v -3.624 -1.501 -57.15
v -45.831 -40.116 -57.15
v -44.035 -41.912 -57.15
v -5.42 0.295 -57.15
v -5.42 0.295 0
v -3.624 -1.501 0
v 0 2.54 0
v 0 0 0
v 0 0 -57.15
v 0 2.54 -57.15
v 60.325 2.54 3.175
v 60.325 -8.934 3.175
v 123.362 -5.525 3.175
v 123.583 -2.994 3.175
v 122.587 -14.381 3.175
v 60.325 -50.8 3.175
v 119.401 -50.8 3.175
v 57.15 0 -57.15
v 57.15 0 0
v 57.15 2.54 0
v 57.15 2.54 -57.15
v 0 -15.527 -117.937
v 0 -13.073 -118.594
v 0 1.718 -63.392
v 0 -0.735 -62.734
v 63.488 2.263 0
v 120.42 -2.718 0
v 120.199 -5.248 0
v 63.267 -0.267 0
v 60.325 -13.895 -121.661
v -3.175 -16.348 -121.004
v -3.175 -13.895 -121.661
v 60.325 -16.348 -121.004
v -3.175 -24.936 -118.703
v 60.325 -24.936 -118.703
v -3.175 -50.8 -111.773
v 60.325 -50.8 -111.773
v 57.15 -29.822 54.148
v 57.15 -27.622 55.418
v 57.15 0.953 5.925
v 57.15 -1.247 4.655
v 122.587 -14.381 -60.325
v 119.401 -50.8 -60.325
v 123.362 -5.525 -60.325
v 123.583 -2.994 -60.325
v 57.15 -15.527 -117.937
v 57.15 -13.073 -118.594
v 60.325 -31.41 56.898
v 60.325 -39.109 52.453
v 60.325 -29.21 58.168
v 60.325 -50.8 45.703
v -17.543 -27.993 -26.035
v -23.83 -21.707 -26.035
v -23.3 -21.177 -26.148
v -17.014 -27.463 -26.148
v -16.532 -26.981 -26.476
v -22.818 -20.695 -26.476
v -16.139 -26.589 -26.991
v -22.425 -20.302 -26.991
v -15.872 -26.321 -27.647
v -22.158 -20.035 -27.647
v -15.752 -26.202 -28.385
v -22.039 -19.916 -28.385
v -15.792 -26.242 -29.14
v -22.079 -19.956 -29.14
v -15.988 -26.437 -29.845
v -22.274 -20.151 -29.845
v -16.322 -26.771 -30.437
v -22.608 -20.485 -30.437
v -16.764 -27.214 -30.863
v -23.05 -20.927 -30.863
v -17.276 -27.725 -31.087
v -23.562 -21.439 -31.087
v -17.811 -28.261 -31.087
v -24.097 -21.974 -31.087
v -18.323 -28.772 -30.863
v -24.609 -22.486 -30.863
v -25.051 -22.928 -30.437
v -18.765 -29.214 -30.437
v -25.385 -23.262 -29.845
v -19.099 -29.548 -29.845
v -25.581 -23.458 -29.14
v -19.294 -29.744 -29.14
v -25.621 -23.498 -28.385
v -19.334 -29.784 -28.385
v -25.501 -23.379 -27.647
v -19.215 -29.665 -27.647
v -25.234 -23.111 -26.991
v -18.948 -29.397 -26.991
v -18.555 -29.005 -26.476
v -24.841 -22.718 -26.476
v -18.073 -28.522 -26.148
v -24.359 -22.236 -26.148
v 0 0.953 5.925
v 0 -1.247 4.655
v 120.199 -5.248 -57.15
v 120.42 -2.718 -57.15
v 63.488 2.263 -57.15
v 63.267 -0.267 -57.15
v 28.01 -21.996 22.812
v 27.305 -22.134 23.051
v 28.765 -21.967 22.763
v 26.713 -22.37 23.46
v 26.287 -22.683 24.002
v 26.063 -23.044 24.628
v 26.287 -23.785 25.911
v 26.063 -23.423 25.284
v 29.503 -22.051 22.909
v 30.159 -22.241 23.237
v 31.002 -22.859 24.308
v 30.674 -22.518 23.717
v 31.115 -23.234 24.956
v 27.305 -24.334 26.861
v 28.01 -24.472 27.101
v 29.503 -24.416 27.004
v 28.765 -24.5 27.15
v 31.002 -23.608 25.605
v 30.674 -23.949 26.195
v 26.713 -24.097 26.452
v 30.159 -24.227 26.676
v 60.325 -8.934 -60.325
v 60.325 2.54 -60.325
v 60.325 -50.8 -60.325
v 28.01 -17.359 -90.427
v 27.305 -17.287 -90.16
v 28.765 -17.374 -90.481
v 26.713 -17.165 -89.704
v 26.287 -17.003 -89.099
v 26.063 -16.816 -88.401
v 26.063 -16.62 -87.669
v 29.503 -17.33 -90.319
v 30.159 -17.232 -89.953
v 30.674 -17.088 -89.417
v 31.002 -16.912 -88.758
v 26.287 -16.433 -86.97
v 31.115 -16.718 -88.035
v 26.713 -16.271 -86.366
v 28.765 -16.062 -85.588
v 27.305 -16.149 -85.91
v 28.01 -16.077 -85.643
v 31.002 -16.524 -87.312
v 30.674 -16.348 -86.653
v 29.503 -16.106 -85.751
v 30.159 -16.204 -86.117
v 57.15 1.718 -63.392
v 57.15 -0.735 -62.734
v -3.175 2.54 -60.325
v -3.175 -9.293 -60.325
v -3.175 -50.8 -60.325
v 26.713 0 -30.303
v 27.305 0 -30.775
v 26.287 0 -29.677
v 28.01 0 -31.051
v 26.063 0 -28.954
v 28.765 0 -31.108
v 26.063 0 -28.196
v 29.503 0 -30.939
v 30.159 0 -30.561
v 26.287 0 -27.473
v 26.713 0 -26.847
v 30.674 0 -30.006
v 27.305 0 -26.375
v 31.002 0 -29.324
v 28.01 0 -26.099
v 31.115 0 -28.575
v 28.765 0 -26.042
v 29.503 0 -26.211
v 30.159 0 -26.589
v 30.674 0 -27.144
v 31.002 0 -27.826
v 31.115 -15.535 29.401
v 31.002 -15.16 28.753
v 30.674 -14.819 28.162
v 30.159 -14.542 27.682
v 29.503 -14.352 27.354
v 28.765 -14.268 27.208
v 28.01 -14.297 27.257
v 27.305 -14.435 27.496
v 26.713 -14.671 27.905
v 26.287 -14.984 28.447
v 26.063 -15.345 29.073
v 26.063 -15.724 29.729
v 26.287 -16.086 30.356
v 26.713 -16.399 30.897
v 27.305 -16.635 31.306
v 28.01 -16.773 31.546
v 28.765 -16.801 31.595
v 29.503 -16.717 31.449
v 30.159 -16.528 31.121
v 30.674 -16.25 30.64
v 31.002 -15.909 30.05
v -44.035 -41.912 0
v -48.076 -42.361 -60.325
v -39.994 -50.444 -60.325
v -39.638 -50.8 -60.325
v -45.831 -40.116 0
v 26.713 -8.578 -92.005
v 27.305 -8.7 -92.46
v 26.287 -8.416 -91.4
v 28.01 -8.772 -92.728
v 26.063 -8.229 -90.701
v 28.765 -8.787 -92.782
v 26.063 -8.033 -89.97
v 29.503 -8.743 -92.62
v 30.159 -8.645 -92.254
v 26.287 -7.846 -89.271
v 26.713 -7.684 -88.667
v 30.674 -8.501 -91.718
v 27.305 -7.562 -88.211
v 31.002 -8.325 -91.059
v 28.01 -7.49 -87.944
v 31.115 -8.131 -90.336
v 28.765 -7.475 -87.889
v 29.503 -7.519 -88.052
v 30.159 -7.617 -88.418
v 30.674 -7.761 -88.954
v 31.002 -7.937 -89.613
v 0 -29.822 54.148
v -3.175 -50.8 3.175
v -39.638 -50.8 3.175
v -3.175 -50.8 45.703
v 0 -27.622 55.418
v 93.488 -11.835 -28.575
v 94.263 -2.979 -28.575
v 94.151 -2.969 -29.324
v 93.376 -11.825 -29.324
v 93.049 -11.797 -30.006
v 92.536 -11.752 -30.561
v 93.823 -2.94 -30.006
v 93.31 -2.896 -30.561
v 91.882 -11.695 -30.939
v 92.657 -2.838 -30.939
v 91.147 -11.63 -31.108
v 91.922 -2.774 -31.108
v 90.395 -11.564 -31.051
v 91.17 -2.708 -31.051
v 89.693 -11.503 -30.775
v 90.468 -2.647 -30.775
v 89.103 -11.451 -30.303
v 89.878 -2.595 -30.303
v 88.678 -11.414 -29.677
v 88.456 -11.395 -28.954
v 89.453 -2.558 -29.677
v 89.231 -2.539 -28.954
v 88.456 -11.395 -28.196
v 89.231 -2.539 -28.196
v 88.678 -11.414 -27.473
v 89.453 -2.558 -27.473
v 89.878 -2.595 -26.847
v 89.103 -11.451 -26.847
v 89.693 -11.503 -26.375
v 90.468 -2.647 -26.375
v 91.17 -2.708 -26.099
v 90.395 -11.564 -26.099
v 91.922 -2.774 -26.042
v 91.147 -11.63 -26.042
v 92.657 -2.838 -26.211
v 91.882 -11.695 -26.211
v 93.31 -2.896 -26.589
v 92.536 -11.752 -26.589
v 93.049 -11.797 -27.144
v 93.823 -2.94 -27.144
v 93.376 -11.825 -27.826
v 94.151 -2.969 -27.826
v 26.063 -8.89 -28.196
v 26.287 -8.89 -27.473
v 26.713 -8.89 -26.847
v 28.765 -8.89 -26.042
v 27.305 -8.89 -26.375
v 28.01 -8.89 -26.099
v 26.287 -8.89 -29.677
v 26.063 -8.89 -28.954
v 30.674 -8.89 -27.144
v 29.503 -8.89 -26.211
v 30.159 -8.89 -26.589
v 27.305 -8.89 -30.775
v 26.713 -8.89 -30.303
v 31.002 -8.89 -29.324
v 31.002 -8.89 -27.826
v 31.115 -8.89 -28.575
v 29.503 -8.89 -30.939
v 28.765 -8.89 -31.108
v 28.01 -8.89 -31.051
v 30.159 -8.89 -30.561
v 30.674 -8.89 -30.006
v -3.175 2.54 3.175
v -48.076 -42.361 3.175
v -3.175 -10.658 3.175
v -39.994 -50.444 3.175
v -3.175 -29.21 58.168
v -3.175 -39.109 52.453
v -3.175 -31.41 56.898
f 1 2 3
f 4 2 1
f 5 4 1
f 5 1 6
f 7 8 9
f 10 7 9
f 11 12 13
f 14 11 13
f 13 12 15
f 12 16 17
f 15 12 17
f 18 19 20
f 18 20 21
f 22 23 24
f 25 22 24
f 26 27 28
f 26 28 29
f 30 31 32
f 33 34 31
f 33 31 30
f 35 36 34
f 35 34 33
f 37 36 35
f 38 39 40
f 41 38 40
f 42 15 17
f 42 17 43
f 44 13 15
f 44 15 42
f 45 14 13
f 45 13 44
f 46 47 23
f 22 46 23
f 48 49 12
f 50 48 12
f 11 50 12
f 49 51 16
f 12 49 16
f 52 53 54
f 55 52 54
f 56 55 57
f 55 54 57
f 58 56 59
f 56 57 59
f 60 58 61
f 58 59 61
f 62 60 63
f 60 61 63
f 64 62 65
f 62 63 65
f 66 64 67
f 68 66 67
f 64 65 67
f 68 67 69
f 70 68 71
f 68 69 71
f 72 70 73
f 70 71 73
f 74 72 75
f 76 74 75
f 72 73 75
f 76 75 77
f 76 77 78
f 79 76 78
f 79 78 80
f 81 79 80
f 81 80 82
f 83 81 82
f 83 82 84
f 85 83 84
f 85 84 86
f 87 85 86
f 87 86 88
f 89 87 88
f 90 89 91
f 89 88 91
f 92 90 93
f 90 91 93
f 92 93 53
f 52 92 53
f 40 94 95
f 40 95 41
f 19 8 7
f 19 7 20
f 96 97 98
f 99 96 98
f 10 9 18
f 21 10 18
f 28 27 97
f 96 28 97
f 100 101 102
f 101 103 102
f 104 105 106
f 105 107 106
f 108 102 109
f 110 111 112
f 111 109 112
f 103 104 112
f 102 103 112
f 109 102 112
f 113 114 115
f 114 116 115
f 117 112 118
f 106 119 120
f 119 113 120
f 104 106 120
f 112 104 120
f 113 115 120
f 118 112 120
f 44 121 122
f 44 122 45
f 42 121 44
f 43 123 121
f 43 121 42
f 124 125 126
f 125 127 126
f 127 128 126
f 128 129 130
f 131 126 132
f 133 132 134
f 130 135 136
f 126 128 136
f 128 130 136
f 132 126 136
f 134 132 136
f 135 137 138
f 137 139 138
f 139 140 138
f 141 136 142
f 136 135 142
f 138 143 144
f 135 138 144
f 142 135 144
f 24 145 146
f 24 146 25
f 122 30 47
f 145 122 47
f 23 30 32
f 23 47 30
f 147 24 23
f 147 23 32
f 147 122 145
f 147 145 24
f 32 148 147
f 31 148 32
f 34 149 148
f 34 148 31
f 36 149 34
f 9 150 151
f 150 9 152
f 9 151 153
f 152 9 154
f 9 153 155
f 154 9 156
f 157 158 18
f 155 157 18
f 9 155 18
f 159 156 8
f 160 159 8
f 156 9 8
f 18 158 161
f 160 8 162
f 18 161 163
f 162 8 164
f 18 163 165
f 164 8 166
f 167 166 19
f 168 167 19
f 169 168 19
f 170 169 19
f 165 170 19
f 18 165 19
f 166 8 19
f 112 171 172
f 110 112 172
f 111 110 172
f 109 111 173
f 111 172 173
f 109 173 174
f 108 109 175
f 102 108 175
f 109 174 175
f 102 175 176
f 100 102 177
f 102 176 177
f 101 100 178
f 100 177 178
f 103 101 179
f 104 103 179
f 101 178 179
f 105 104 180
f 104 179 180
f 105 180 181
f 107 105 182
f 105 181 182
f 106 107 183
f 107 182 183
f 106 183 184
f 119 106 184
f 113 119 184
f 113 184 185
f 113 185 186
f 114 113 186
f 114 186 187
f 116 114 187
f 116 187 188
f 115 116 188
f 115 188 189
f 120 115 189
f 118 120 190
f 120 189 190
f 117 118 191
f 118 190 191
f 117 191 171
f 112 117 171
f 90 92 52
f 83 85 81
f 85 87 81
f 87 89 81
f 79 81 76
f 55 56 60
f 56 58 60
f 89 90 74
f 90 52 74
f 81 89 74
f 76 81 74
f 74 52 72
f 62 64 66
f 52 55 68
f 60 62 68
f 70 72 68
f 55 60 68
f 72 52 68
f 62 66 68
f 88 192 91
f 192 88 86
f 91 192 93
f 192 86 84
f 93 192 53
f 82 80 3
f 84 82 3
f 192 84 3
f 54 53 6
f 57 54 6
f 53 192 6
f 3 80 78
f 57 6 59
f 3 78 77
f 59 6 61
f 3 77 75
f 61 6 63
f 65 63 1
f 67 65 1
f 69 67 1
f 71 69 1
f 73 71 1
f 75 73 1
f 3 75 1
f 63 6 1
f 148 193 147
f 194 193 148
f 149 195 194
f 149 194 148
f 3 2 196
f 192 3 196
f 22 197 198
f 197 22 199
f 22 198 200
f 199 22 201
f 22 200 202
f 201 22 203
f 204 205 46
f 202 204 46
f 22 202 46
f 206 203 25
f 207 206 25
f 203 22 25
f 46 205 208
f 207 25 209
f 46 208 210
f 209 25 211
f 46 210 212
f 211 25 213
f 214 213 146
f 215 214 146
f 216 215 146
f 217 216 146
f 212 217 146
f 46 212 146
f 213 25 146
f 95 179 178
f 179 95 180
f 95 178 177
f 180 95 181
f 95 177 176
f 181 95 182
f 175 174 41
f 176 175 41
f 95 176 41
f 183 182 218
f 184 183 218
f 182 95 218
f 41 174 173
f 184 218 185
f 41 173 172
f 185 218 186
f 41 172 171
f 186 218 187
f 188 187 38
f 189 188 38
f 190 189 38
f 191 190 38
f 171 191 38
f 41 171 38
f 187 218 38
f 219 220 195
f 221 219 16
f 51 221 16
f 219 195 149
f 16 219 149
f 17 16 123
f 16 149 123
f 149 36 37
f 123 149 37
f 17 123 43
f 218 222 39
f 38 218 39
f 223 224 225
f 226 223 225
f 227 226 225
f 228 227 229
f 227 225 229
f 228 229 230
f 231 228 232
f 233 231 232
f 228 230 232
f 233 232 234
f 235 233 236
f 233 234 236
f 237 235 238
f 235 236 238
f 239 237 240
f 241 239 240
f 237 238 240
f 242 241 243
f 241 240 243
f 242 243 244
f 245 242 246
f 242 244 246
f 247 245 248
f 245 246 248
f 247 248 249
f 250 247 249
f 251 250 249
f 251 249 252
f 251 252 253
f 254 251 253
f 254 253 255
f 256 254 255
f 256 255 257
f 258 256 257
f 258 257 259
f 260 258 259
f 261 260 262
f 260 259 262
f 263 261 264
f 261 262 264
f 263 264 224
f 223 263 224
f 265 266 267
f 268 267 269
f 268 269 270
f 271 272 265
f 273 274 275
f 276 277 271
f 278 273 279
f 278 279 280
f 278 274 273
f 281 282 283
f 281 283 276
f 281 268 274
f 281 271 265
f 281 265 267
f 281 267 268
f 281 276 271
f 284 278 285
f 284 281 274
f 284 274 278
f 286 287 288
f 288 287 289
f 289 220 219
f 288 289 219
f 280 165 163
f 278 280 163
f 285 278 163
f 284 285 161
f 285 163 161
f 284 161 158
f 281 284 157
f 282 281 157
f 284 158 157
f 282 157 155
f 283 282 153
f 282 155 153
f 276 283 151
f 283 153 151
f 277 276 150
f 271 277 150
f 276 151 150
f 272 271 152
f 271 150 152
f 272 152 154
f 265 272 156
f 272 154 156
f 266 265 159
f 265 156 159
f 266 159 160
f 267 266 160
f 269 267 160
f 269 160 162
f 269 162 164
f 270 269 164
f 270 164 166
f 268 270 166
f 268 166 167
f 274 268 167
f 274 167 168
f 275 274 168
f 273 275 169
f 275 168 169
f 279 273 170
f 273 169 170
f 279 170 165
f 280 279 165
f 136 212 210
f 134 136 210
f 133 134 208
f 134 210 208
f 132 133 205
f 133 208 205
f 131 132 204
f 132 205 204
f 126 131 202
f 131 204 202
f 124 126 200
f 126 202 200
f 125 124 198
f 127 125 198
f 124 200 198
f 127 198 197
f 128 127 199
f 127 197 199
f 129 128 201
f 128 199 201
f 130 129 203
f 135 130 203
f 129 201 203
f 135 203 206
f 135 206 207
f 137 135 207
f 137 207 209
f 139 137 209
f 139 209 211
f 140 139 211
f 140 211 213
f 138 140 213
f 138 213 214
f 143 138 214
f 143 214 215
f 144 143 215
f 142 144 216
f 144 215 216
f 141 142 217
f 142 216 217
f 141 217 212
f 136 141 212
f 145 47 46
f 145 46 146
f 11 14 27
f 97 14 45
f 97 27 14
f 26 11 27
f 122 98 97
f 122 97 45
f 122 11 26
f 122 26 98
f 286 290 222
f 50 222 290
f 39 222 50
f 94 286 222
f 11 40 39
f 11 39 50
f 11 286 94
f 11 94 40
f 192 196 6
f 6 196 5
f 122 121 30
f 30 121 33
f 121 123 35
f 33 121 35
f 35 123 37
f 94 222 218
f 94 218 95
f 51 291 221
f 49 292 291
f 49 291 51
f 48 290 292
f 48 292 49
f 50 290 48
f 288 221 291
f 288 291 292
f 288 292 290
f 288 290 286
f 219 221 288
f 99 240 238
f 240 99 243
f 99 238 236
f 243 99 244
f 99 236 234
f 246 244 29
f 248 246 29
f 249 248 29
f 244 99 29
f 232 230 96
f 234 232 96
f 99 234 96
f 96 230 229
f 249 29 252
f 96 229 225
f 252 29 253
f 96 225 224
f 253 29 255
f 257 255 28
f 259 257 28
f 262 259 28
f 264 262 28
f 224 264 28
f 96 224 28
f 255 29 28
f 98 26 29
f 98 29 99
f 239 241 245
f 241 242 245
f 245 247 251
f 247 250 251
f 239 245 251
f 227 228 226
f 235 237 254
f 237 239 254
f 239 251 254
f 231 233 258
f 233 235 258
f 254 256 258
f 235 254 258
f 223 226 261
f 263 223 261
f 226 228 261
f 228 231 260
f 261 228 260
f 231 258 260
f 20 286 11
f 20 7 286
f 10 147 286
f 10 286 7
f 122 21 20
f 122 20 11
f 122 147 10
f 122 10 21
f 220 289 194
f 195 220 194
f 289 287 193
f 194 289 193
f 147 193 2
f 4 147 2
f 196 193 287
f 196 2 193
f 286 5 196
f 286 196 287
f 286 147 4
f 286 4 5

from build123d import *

# Parameters (mm, degrees)
SKETCH1_W            = 63.5
SKETCH1_H            = 63.5
SKETCH1_W_2          = 57.15
SKETCH1_H_2          = 57.15
BOSS_EXTRUDE1_DEPTH  = 2.54
SKETCH2_W            = 63.5
SKETCH2_H            = 63.5
BOSS_EXTRUDE2_DEPTH  = 8.89
SKETCH3_R            = 2.54
CUT_EXTRUDE1_DEPTH   = 8.89
SKETCH4_W            = 63.5
SKETCH4_H            = 63.5
SKETCH4_W_2          = 57.15
SKETCH4_H_2          = 57.15
BOSS_EXTRUDE3_DEPTH  = 2.54
SKETCH5_W            = 63.5
SKETCH5_H            = 63.5
BOSS_EXTRUDE4_DEPTH  = 8.89
SKETCH6_R            = 2.54
CUT_EXTRUDE2_DEPTH   = 8.89
SKETCH7_W            = 63.5
SKETCH7_H            = 63.5
SKETCH7_W_2          = 57.15
SKETCH7_H_2          = 57.15
BOSS_EXTRUDE5_DEPTH  = 2.54
SKETCH8_W            = 63.5
SKETCH8_H            = 63.5
BOSS_EXTRUDE6_DEPTH  = 8.89
SKETCH9_R            = 2.54
CUT_EXTRUDE3_DEPTH   = 8.89
SKETCH10_W           = 63.5
SKETCH10_H           = 63.5
SKETCH10_W_2         = 57.15
SKETCH10_H_2         = 57.15
BOSS_EXTRUDE7_DEPTH  = 2.54
SKETCH11_W           = 63.5
SKETCH11_H           = 63.5
BOSS_EXTRUDE8_DEPTH  = 8.89
SKETCH12_R           = 2.54
CUT_EXTRUDE4_DEPTH   = 8.89
SKETCH14_W           = 63.5
SKETCH14_H           = 63.5
SKETCH14_W_2         = 57.15
SKETCH14_H_2         = 57.15
BOSS_EXTRUDE10_DEPTH = 2.54
SKETCH15_W           = 63.5
SKETCH15_H           = 63.5
BOSS_EXTRUDE11_DEPTH = 8.89
SKETCH16_R           = 2.54
CUT_EXTRUDE5_DEPTH   = 8.89
BOSS_EXTRUDE12_REACH = 55.34
SKETCH18_W           = 63.258363329
SKETCH18_H           = 63.5
CUT_EXTRUDE7_REACH   = 53.155
SKETCH19_W           = 21.300485008
SKETCH19_H           = 63.5
BOSS_EXTRUDE15_REACH = 55.34
SKETCH20_W           = 63.5
SKETCH20_H           = 58.16761314
CUT_EXTRUDE8_START   = -13.499985
SKETCH21_W           = 63.5
SKETCH21_H           = 36.305948049
CUT_EXTRUDE8_DEPTH   = 13.499985
BOSS_EXTRUDE16_REACH = 55.34
SKETCH22_W           = 48.076280605
SKETCH22_H           = 63.5
CUT_EXTRUDE9_START   = -0.504151
SKETCH23_W           = 63.5
SKETCH23_H           = 4.915504187
CUT_EXTRUDE9_DEPTH   = 0.504151
BOSS_EXTRUDE18_REACH = 55.34
SKETCH24_W           = 63.5
SKETCH24_H           = 64.511289969
CUT_EXTRUDE10_START  = -26.776858
SKETCH25_W           = 63.5
SKETCH25_H           = 23.443872205
CUT_EXTRUDE10_DEPTH  = 26.776858
SKETCH26_W           = 63.5
SKETCH26_H           = 63.5
BOSS_EXTRUDE19_DEPTH = 41.91


with BuildPart() as part:
    # Sketch1 → Boss-Extrude1 (new body)
    with BuildSketch(Plane(origin=(0, 0, 0), x_dir=(1, 0, 0), z_dir=(0, 1, 0))):
        with Locations((28.575, 28.575)):
            Rectangle(SKETCH1_W, SKETCH1_H)
        with Locations((28.575, 28.575)):
            Rectangle(SKETCH1_W_2, SKETCH1_H_2, mode=Mode.SUBTRACT)
    extrude(amount=BOSS_EXTRUDE1_DEPTH)

    # Sketch2 → Boss-Extrude2 (add)
    with BuildSketch(Plane.XZ):
        with Locations((28.575, -28.575)):
            Rectangle(SKETCH2_W, SKETCH2_H)
    extrude(amount=BOSS_EXTRUDE2_DEPTH)

    # Sketch3 → Cut-Extrude1 (cut)
    with BuildSketch(Plane(origin=(0, 0, 0), x_dir=(1, 0, 0), z_dir=(0, 1, 0))):
        with Locations((28.575, 28.575)):
            Circle(SKETCH3_R)
    extrude(amount=-CUT_EXTRUDE1_DEPTH, mode=Mode.SUBTRACT)



with BuildPart() as body_2:
    # Sketch4 → Boss-Extrude3 (new body)
    with BuildSketch(Plane(origin=(0.678769335, 7.758369005, 0), x_dir=(0, 0, -1), z_dir=(0.087155743, 0.996194698, 0))):
        with Locations((28.575, -91.624069576)):
            Rectangle(SKETCH4_W, SKETCH4_H)
        with Locations((28.575, -91.624069576)):
            Rectangle(SKETCH4_W_2, SKETCH4_H_2, mode=Mode.SUBTRACT)
    extrude(amount=-BOSS_EXTRUDE3_DEPTH)

    # Sketch5 → Boss-Extrude4 (add)
    with BuildSketch(Plane(origin=(0.457393749, 5.228034472, 0), x_dir=(0.996194698, -0.087155743, 0), z_dir=(-0.087155743, -0.996194698, 0))):
        with Locations((91.624069576, -28.575)):
            Rectangle(SKETCH5_W, SKETCH5_H)
    extrude(amount=BOSS_EXTRUDE4_DEPTH)

    # Sketch6 → Cut-Extrude2 (cut)
    with BuildSketch(Plane(origin=(0.457393749, 5.228034472, 0), x_dir=(0.996194698, -0.087155743, 0), z_dir=(0.087155743, 0.996194698, 0))):
        with Locations((91.624069576, 28.575)):
            Circle(SKETCH6_R)
    extrude(amount=-CUT_EXTRUDE2_DEPTH, mode=Mode.SUBTRACT)


with BuildPart() as part_1:
    add(part.part)

    add(body_2.part)  # Boss-Extrude5 merges body 2
    # Sketch7 → Boss-Extrude5 (add)
    with BuildSketch(Plane(origin=(0, 17.451102263, -4.676008758), x_dir=(-1, 0, 0), z_dir=(0, 0.965925826, -0.258819045))):
        with Locations((-28.575, -89.362075096)):
            Rectangle(SKETCH7_W, SKETCH7_H)
        with Locations((-28.575, -89.362075096)):
            Rectangle(SKETCH7_W_2, SKETCH7_H_2, mode=Mode.SUBTRACT)
    extrude(amount=-BOSS_EXTRUDE5_DEPTH)

    # Sketch8 → Boss-Extrude6 (add)
    with BuildSketch(Plane(origin=(0, 14.997650664, -4.018608384), x_dir=(1, 0, 0), z_dir=(0, -0.965925826, 0.258819045))):
        with Locations((28.575, -89.362075096)):
            Rectangle(SKETCH8_W, SKETCH8_H)
    extrude(amount=BOSS_EXTRUDE6_DEPTH)

    # Sketch9 → Cut-Extrude3 (cut)
    with BuildSketch(Plane(origin=(0, 14.997650664, -4.018608384), x_dir=(1, 0, 0), z_dir=(0, 0.965925826, -0.258819045))):
        with Locations((28.575, 89.362075096)):
            Circle(SKETCH9_R)
    extrude(amount=-CUT_EXTRUDE3_DEPTH, mode=Mode.SUBTRACT)

    # Sketch10 → Boss-Extrude7 (add)
    with BuildSketch(Plane(origin=(0, 3.279815329, 1.893602263), x_dir=(1, 0, 0), z_dir=(0, 0.866025404, 0.5))):
        with Locations((28.575, -33.229630657)):
            Rectangle(SKETCH10_W, SKETCH10_H)
        with Locations((28.575, -33.229630657)):
            Rectangle(SKETCH10_W_2, SKETCH10_H_2, mode=Mode.SUBTRACT)
    extrude(amount=-BOSS_EXTRUDE7_DEPTH)

    # Sketch11 → Boss-Extrude8 (add)
    with BuildSketch(Plane(origin=(0, 1.080110803, 0.623602263), x_dir=(1, 0, 0), z_dir=(0, -0.866025404, -0.5))):
        with Locations((28.575, 33.229630657)):
            Rectangle(SKETCH11_W, SKETCH11_H)
    extrude(amount=BOSS_EXTRUDE8_DEPTH)

    # Sketch12 → Cut-Extrude4 (cut)
    with BuildSketch(Plane(origin=(0, 1.080110803, 0.623602263), x_dir=(1, 0, 0), z_dir=(0, 0.866025404, 0.5))):
        with Locations((28.575, -33.229630657)):
            Circle(SKETCH12_R)
    extrude(amount=-CUT_EXTRUDE4_DEPTH, mode=Mode.SUBTRACT)

    # Sketch14 → Boss-Extrude10 (add)
    with BuildSketch(Plane(origin=(-2.8575, 2.8575, 0), x_dir=(0, 0, 1), z_dir=(-0.707106781, 0.707106781, 0))):
        with Locations((-28.575, -32.199012806)):
            Rectangle(SKETCH14_W, SKETCH14_H)
        with Locations((-28.575, -32.199012806)):
            Rectangle(SKETCH14_W_2, SKETCH14_H_2, mode=Mode.SUBTRACT)
    extrude(amount=-BOSS_EXTRUDE10_DEPTH)

    # Sketch15 → Boss-Extrude11 (add)
    with BuildSketch(Plane(origin=(-1.061448776, 1.061448776, 0), x_dir=(0, 0, -1), z_dir=(0.707106781, -0.707106781, 0))):
        with Locations((28.575, -32.199012806)):
            Rectangle(SKETCH15_W, SKETCH15_H)
    extrude(amount=BOSS_EXTRUDE11_DEPTH)

    # Sketch16 → Cut-Extrude5 (cut)
    with BuildSketch(Plane(origin=(-1.061448776, 1.061448776, 0), x_dir=(0, 0, 1), z_dir=(-0.707106781, 0.707106781, 0))):
        with Locations((-28.575, -32.199012806)):
            Circle(SKETCH16_R)
    extrude(amount=-CUT_EXTRUDE5_DEPTH, mode=Mode.SUBTRACT)

    # Boss-Extrude12: up to this face of the body (flat: up to its plane)
    boss_extrude12_end = Plane(part_1.part.faces().sort_by_distance((60.351110962, -8.935945156, -58.051047878))[0])
    # Sketch18 → Boss-Extrude12 (add, up to the picked face)
    with BuildSketch(Plane(origin=(0, -50.8, 0), x_dir=(1, 0, 0), z_dir=(0, 1, 0)), mode=Mode.PRIVATE) as boss_extrude12_sk1:
        with Locations((91.954181664, 28.575)):
            Rectangle(SKETCH18_W, SKETCH18_H)
    boss_extrude12_tool1 = split(extrude(boss_extrude12_sk1.sketch, amount=BOSS_EXTRUDE12_REACH, mode=Mode.PRIVATE), bisect_by=boss_extrude12_end, keep=Keep.BOTH, mode=Mode.PRIVATE)
    add(boss_extrude12_tool1.solids().sort_by_distance((91.954182, -50.8, -28.575))[0])

    # Cut-Extrude7: up to this face of the body (flat: up to its plane)
    cut_extrude7_end = Plane(part_1.part.faces().sort_by_distance((91.954181664, -50.8, -28.575))[0])
    # Sketch19 → Cut-Extrude7 (cut, up to the picked face)
    with BuildSketch(Plane(origin=(-0.317420804, -3.628136394, 0), x_dir=(0.996194698, -0.087155743, 0), z_dir=(0.087155743, 0.996194698, 0)), mode=Mode.PRIVATE) as cut_extrude7_sk1:
        with Locations((134.02431208, 28.575)):
            Rectangle(SKETCH19_W, SKETCH19_H)
    cut_extrude7_tool1 = split(extrude(cut_extrude7_sk1.sketch, amount=-CUT_EXTRUDE7_REACH, mode=Mode.PRIVATE), bisect_by=cut_extrude7_end, keep=Keep.BOTH, mode=Mode.PRIVATE)
    add(cut_extrude7_tool1.solids().sort_by_distance((133.196888, -15.309125, -28.575))[0], mode=Mode.SUBTRACT)

    # Boss-Extrude15: up to this face of the body (flat: up to its plane)
    boss_extrude15_end = Plane(part_1.part.faces().sort_by_distance((-1.691883068, -11.096545593, 3.934189806))[0])
    # Sketch20 → Boss-Extrude15 (add, up to the picked face)
    with BuildSketch(Plane(origin=(0, -50.8, 0), x_dir=(1, 0, 0), z_dir=(0, 1, 0)), mode=Mode.PRIVATE) as boss_extrude15_sk1:
        with Locations((28.575, -29.08380657)):
            Rectangle(SKETCH20_W, SKETCH20_H)
    boss_extrude15_tool1 = split(extrude(boss_extrude15_sk1.sketch, amount=BOSS_EXTRUDE15_REACH, mode=Mode.PRIVATE), bisect_by=boss_extrude15_end, keep=Keep.BOTH, mode=Mode.PRIVATE)
    add(boss_extrude15_tool1.solids().sort_by_distance((28.575, -50.8, 29.083807))[0])

    # Sketch21 → Cut-Extrude8 (cut)
    with BuildSketch(Plane(origin=(0, -6.618855037, -3.821397737), x_dir=(1, 0, 0), z_dir=(0, 0.866025404, 0.5)).offset(CUT_EXTRUDE8_START)):
        with Locations((28.575, -83.132604681)):
            Rectangle(SKETCH21_W, SKETCH21_H)
    extrude(amount=CUT_EXTRUDE8_DEPTH, mode=Mode.SUBTRACT)

    # Boss-Extrude16: up to this face of the body (flat: up to its plane)
    boss_extrude16_end = Plane(part_1.part.faces().sort_by_distance((-3.786785852, -14.23624687, 1.5875))[0])
    # Sketch22 → Boss-Extrude16 (add, up to the picked face)
    with BuildSketch(Plane(origin=(0, -50.8, 0), x_dir=(1, 0, 0), z_dir=(0, 1, 0)), mode=Mode.PRIVATE) as boss_extrude16_sk1:
        with Locations((-24.038140303, 28.575)):
            Rectangle(SKETCH22_W, SKETCH22_H)
    boss_extrude16_tool1 = split(extrude(boss_extrude16_sk1.sketch, amount=BOSS_EXTRUDE16_REACH, mode=Mode.PRIVATE), bisect_by=boss_extrude16_end, keep=Keep.BOTH, mode=Mode.PRIVATE)
    add(boss_extrude16_tool1.solids().sort_by_distance((-24.03814, -50.8, -28.575))[0])

    # Sketch23 → Cut-Extrude9 (cut)
    with BuildSketch(Plane(origin=(5.224730509, -5.224730509, 0), x_dir=(0, 0, 1), z_dir=(-0.707106781, 0.707106781, 0)).offset(CUT_EXTRUDE9_START)):
        with Locations((-28.575, -66.4067649)):
            Rectangle(SKETCH23_W, SKETCH23_H)
    extrude(amount=CUT_EXTRUDE9_DEPTH, mode=Mode.SUBTRACT)

    # Boss-Extrude18: up to this face of the body (flat: up to its plane)
    boss_extrude18_end = Plane(part_1.part.faces().sort_by_distance((-1.009372862, -9.522895431, -61.182209856))[0])
    # Sketch24 → Boss-Extrude18 (add, up to the picked face)
    with BuildSketch(Plane(origin=(0, -50.8, 0), x_dir=(1, 0, 0), z_dir=(0, 1, 0)), mode=Mode.PRIVATE) as boss_extrude18_sk1:
        with Locations((28.575, 89.405644985)):
            Rectangle(SKETCH24_W, SKETCH24_H)
    boss_extrude18_tool1 = split(extrude(boss_extrude18_sk1.sketch, amount=BOSS_EXTRUDE18_REACH, mode=Mode.PRIVATE), bisect_by=boss_extrude18_end, keep=Keep.BOTH, mode=Mode.PRIVATE)
    add(boss_extrude18_tool1.solids().sort_by_distance((28.575, -50.8, -89.405645))[0])

    # Sketch25 → Cut-Extrude10 (cut)
    with BuildSketch(Plane(origin=(0, 6.410570068, -1.717707073), x_dir=(1, 0, 0), z_dir=(0, 0.965925826, -0.258819045)).offset(CUT_EXTRUDE10_START)):
        with Locations((28.575, 132.834011199)):
            Rectangle(SKETCH25_W, SKETCH25_H)
    extrude(amount=CUT_EXTRUDE10_DEPTH, mode=Mode.SUBTRACT)

    # Sketch26 → Boss-Extrude19 (add)
    with BuildSketch(Plane(origin=(0, -50.8, 0), x_dir=(1, 0, 0), z_dir=(0, 1, 0))):
        with Locations((28.575, 28.575)):
            Rectangle(SKETCH26_W, SKETCH26_H)
    extrude(amount=BOSS_EXTRUDE19_DEPTH)


solid = part_1.part
